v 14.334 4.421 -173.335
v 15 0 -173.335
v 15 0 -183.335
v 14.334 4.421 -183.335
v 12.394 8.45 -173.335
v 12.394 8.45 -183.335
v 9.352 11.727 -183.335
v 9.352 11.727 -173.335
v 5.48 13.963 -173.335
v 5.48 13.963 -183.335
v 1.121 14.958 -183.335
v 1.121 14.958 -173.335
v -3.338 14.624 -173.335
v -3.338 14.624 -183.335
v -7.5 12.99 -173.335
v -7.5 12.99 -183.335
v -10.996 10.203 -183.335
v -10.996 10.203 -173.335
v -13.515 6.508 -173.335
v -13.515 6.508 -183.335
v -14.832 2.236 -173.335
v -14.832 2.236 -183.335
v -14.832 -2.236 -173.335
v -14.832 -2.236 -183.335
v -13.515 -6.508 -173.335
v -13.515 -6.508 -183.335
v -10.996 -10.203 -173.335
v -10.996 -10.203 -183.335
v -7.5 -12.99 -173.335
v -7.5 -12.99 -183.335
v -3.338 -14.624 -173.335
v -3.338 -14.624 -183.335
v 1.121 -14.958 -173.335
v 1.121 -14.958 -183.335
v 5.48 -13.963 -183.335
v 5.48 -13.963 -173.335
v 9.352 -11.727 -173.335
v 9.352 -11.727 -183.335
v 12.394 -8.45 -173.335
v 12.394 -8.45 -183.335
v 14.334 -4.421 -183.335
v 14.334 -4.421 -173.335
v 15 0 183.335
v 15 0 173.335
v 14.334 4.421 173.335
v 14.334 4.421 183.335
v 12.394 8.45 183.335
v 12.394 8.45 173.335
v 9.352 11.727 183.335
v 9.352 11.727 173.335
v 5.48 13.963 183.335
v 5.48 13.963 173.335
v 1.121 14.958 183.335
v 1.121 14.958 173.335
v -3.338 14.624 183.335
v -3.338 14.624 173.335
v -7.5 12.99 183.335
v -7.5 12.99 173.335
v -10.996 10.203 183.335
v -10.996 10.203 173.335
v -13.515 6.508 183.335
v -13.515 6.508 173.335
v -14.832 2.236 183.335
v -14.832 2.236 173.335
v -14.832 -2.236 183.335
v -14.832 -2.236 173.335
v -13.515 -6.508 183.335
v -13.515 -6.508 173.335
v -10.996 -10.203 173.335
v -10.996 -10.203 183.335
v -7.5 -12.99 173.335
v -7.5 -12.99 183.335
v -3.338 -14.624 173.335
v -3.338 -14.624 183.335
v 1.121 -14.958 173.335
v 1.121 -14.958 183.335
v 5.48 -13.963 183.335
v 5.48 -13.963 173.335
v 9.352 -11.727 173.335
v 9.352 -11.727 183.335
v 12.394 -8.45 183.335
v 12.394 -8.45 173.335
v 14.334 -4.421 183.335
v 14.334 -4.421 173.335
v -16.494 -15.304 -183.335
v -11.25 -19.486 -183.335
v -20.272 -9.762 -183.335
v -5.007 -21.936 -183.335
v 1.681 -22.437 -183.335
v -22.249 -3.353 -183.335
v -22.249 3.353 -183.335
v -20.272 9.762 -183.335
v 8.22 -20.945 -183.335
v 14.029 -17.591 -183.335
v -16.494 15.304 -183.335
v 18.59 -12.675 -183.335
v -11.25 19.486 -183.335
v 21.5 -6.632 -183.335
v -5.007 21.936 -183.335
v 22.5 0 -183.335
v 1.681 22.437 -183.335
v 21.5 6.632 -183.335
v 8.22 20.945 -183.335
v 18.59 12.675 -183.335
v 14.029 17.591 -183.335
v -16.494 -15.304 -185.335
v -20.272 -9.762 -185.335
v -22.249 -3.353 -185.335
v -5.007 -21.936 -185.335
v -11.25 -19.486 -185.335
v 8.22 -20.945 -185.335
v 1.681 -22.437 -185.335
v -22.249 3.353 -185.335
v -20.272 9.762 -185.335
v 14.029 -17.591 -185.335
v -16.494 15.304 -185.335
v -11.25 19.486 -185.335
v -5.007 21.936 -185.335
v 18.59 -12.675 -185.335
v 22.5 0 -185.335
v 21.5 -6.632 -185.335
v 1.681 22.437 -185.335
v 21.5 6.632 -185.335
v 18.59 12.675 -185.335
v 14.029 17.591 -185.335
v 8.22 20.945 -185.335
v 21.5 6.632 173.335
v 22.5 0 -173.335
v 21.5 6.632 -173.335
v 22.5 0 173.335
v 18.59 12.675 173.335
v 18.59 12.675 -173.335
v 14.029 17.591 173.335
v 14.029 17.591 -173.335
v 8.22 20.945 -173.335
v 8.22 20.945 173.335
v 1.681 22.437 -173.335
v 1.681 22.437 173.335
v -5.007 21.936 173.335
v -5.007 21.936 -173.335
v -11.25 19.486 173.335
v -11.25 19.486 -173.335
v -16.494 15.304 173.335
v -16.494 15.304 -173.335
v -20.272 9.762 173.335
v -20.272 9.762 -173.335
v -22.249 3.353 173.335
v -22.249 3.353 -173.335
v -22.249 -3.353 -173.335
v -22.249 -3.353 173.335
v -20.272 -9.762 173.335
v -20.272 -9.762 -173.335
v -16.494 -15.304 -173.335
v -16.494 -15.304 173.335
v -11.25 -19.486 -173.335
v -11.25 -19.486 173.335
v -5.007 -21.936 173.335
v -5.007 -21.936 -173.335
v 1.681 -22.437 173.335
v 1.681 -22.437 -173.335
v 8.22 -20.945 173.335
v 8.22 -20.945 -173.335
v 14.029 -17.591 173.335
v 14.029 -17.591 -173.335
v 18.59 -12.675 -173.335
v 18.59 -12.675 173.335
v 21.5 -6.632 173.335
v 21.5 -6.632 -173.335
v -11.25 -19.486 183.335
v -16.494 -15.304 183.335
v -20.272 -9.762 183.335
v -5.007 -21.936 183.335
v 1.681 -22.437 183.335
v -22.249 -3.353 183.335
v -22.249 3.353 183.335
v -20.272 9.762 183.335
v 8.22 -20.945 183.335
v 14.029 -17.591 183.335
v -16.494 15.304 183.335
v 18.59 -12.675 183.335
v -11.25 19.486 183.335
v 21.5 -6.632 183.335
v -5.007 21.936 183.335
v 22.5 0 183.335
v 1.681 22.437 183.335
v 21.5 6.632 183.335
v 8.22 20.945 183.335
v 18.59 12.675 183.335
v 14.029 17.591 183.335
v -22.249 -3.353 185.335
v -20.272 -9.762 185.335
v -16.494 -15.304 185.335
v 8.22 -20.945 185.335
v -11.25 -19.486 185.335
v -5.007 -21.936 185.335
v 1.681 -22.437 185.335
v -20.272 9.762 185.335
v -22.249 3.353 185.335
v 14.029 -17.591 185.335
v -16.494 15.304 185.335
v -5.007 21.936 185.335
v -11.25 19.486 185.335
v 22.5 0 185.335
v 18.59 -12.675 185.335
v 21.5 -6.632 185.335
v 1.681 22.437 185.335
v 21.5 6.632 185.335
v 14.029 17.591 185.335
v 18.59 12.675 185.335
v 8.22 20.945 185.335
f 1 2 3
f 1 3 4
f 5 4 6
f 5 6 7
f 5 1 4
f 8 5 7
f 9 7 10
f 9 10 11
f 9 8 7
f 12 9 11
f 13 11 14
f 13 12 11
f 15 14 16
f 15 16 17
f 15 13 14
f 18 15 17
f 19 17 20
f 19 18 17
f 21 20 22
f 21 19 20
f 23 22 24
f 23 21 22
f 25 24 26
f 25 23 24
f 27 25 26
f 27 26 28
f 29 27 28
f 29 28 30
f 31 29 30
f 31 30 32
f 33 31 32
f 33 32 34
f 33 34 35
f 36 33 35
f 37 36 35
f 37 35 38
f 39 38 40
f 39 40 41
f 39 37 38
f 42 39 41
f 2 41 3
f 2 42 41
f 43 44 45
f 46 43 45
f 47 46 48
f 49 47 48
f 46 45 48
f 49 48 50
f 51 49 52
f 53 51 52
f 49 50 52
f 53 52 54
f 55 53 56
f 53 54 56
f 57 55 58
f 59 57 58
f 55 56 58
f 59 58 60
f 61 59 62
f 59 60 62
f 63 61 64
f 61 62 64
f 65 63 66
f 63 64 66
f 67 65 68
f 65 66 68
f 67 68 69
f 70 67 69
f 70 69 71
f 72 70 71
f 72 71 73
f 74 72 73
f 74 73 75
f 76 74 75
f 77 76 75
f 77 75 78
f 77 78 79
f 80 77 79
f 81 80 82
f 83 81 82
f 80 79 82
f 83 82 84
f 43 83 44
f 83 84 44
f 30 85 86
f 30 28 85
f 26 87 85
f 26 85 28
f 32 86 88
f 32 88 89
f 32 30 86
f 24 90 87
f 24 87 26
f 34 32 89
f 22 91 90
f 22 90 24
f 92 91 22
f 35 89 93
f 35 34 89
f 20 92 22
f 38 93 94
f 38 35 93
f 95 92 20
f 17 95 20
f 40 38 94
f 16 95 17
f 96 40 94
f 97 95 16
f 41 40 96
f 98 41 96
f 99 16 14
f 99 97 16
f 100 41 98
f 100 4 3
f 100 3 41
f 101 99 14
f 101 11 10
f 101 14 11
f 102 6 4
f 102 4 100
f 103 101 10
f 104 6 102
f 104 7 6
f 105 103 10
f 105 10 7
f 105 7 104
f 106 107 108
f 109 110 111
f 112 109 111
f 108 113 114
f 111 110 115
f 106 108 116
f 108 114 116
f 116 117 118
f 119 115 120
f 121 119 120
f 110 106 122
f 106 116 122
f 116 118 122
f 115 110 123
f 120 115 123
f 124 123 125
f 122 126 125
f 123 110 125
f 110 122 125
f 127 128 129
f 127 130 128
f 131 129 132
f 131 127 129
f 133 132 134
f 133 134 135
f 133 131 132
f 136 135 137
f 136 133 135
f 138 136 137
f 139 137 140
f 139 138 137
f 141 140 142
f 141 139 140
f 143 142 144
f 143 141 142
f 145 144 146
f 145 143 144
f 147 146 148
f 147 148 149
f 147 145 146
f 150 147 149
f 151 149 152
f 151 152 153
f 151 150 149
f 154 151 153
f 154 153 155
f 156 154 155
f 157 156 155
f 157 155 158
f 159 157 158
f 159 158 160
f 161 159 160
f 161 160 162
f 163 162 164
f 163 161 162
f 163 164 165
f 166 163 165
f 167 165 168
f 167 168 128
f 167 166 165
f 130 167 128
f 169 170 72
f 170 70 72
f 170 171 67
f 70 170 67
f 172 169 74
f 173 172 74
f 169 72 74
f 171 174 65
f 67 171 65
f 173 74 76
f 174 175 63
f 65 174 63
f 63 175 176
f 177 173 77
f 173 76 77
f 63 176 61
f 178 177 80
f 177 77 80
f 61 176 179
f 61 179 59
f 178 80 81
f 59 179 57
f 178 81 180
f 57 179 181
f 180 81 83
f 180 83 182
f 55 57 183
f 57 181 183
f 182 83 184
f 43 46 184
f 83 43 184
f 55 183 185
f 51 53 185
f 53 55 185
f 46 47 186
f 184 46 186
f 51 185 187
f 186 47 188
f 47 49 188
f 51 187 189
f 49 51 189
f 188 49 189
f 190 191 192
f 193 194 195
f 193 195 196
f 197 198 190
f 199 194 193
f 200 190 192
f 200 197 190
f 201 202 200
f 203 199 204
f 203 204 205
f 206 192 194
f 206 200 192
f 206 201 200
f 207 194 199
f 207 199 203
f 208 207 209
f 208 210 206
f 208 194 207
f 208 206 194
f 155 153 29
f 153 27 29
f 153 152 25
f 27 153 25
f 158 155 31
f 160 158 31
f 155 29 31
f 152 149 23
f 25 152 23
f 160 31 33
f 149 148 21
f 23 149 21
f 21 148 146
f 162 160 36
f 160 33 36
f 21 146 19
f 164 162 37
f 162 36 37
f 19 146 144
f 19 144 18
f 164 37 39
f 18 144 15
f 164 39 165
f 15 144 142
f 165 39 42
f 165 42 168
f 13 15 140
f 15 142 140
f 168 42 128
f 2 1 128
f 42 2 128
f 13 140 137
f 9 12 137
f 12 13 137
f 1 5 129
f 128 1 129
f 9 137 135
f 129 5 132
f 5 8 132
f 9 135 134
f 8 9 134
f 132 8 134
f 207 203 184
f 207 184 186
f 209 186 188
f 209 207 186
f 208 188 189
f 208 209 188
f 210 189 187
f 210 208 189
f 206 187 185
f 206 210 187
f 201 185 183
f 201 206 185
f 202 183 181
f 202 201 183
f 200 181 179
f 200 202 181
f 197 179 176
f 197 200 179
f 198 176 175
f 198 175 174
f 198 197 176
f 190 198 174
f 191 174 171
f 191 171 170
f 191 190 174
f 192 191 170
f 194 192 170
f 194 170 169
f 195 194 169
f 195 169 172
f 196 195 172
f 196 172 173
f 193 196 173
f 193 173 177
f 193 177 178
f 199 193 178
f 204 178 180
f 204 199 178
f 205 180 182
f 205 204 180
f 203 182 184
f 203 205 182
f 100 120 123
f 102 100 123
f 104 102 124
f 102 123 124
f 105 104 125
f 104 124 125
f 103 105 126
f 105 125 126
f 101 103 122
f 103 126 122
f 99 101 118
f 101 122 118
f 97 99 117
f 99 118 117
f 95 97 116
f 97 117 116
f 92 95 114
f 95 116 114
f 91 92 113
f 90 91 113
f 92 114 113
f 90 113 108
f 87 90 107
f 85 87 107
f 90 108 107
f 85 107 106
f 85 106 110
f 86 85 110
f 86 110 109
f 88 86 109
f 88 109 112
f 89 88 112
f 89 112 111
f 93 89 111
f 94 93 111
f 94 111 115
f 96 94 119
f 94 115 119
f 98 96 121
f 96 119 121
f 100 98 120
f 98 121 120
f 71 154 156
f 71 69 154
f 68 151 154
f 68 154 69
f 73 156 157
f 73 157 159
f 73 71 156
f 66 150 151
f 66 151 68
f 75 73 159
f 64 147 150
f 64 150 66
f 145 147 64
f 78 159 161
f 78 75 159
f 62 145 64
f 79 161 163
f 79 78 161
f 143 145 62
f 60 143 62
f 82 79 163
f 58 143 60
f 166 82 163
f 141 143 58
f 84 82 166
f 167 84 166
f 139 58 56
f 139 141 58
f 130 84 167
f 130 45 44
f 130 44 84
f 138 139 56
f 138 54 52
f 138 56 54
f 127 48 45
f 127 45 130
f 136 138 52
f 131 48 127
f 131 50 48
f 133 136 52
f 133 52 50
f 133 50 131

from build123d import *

# Parameters (mm, degrees)
SKETCH1_R           = 22.5
BOSS_EXTRUDE1_DEPTH = 173.335
SKETCH2_R           = 15
BOSS_EXTRUDE2_DEPTH = 10
BOSS_EXTRUDE3_START = 2
SKETCH3_R           = 22.5
BOSS_EXTRUDE3_DEPTH = 2


with BuildPart() as part:
    # Sketch1 → Boss-Extrude1 (new, symmetric)
    with BuildSketch(Plane.XY):
        Circle(SKETCH1_R)
    extrude(amount=BOSS_EXTRUDE1_DEPTH, both=True)

    # Sketch2 → Boss-Extrude2 (add)
    with BuildSketch(Plane.XY.offset(173.335)):
        Circle(SKETCH2_R)
    boss_extrude2 = extrude(amount=BOSS_EXTRUDE2_DEPTH)

    # Sketch3 → Boss-Extrude3 (add)
    with BuildSketch(Plane.XY.offset(183.335).offset(BOSS_EXTRUDE3_START)):
        Circle(SKETCH3_R)
    boss_extrude3 = extrude(amount=-BOSS_EXTRUDE3_DEPTH)

    # Mirror1: Boss-Extrude2, Boss-Extrude3 across plane
    add(boss_extrude2.mirror(Plane.XY))
    add(boss_extrude3.mirror(Plane.XY))


solid = part.part
